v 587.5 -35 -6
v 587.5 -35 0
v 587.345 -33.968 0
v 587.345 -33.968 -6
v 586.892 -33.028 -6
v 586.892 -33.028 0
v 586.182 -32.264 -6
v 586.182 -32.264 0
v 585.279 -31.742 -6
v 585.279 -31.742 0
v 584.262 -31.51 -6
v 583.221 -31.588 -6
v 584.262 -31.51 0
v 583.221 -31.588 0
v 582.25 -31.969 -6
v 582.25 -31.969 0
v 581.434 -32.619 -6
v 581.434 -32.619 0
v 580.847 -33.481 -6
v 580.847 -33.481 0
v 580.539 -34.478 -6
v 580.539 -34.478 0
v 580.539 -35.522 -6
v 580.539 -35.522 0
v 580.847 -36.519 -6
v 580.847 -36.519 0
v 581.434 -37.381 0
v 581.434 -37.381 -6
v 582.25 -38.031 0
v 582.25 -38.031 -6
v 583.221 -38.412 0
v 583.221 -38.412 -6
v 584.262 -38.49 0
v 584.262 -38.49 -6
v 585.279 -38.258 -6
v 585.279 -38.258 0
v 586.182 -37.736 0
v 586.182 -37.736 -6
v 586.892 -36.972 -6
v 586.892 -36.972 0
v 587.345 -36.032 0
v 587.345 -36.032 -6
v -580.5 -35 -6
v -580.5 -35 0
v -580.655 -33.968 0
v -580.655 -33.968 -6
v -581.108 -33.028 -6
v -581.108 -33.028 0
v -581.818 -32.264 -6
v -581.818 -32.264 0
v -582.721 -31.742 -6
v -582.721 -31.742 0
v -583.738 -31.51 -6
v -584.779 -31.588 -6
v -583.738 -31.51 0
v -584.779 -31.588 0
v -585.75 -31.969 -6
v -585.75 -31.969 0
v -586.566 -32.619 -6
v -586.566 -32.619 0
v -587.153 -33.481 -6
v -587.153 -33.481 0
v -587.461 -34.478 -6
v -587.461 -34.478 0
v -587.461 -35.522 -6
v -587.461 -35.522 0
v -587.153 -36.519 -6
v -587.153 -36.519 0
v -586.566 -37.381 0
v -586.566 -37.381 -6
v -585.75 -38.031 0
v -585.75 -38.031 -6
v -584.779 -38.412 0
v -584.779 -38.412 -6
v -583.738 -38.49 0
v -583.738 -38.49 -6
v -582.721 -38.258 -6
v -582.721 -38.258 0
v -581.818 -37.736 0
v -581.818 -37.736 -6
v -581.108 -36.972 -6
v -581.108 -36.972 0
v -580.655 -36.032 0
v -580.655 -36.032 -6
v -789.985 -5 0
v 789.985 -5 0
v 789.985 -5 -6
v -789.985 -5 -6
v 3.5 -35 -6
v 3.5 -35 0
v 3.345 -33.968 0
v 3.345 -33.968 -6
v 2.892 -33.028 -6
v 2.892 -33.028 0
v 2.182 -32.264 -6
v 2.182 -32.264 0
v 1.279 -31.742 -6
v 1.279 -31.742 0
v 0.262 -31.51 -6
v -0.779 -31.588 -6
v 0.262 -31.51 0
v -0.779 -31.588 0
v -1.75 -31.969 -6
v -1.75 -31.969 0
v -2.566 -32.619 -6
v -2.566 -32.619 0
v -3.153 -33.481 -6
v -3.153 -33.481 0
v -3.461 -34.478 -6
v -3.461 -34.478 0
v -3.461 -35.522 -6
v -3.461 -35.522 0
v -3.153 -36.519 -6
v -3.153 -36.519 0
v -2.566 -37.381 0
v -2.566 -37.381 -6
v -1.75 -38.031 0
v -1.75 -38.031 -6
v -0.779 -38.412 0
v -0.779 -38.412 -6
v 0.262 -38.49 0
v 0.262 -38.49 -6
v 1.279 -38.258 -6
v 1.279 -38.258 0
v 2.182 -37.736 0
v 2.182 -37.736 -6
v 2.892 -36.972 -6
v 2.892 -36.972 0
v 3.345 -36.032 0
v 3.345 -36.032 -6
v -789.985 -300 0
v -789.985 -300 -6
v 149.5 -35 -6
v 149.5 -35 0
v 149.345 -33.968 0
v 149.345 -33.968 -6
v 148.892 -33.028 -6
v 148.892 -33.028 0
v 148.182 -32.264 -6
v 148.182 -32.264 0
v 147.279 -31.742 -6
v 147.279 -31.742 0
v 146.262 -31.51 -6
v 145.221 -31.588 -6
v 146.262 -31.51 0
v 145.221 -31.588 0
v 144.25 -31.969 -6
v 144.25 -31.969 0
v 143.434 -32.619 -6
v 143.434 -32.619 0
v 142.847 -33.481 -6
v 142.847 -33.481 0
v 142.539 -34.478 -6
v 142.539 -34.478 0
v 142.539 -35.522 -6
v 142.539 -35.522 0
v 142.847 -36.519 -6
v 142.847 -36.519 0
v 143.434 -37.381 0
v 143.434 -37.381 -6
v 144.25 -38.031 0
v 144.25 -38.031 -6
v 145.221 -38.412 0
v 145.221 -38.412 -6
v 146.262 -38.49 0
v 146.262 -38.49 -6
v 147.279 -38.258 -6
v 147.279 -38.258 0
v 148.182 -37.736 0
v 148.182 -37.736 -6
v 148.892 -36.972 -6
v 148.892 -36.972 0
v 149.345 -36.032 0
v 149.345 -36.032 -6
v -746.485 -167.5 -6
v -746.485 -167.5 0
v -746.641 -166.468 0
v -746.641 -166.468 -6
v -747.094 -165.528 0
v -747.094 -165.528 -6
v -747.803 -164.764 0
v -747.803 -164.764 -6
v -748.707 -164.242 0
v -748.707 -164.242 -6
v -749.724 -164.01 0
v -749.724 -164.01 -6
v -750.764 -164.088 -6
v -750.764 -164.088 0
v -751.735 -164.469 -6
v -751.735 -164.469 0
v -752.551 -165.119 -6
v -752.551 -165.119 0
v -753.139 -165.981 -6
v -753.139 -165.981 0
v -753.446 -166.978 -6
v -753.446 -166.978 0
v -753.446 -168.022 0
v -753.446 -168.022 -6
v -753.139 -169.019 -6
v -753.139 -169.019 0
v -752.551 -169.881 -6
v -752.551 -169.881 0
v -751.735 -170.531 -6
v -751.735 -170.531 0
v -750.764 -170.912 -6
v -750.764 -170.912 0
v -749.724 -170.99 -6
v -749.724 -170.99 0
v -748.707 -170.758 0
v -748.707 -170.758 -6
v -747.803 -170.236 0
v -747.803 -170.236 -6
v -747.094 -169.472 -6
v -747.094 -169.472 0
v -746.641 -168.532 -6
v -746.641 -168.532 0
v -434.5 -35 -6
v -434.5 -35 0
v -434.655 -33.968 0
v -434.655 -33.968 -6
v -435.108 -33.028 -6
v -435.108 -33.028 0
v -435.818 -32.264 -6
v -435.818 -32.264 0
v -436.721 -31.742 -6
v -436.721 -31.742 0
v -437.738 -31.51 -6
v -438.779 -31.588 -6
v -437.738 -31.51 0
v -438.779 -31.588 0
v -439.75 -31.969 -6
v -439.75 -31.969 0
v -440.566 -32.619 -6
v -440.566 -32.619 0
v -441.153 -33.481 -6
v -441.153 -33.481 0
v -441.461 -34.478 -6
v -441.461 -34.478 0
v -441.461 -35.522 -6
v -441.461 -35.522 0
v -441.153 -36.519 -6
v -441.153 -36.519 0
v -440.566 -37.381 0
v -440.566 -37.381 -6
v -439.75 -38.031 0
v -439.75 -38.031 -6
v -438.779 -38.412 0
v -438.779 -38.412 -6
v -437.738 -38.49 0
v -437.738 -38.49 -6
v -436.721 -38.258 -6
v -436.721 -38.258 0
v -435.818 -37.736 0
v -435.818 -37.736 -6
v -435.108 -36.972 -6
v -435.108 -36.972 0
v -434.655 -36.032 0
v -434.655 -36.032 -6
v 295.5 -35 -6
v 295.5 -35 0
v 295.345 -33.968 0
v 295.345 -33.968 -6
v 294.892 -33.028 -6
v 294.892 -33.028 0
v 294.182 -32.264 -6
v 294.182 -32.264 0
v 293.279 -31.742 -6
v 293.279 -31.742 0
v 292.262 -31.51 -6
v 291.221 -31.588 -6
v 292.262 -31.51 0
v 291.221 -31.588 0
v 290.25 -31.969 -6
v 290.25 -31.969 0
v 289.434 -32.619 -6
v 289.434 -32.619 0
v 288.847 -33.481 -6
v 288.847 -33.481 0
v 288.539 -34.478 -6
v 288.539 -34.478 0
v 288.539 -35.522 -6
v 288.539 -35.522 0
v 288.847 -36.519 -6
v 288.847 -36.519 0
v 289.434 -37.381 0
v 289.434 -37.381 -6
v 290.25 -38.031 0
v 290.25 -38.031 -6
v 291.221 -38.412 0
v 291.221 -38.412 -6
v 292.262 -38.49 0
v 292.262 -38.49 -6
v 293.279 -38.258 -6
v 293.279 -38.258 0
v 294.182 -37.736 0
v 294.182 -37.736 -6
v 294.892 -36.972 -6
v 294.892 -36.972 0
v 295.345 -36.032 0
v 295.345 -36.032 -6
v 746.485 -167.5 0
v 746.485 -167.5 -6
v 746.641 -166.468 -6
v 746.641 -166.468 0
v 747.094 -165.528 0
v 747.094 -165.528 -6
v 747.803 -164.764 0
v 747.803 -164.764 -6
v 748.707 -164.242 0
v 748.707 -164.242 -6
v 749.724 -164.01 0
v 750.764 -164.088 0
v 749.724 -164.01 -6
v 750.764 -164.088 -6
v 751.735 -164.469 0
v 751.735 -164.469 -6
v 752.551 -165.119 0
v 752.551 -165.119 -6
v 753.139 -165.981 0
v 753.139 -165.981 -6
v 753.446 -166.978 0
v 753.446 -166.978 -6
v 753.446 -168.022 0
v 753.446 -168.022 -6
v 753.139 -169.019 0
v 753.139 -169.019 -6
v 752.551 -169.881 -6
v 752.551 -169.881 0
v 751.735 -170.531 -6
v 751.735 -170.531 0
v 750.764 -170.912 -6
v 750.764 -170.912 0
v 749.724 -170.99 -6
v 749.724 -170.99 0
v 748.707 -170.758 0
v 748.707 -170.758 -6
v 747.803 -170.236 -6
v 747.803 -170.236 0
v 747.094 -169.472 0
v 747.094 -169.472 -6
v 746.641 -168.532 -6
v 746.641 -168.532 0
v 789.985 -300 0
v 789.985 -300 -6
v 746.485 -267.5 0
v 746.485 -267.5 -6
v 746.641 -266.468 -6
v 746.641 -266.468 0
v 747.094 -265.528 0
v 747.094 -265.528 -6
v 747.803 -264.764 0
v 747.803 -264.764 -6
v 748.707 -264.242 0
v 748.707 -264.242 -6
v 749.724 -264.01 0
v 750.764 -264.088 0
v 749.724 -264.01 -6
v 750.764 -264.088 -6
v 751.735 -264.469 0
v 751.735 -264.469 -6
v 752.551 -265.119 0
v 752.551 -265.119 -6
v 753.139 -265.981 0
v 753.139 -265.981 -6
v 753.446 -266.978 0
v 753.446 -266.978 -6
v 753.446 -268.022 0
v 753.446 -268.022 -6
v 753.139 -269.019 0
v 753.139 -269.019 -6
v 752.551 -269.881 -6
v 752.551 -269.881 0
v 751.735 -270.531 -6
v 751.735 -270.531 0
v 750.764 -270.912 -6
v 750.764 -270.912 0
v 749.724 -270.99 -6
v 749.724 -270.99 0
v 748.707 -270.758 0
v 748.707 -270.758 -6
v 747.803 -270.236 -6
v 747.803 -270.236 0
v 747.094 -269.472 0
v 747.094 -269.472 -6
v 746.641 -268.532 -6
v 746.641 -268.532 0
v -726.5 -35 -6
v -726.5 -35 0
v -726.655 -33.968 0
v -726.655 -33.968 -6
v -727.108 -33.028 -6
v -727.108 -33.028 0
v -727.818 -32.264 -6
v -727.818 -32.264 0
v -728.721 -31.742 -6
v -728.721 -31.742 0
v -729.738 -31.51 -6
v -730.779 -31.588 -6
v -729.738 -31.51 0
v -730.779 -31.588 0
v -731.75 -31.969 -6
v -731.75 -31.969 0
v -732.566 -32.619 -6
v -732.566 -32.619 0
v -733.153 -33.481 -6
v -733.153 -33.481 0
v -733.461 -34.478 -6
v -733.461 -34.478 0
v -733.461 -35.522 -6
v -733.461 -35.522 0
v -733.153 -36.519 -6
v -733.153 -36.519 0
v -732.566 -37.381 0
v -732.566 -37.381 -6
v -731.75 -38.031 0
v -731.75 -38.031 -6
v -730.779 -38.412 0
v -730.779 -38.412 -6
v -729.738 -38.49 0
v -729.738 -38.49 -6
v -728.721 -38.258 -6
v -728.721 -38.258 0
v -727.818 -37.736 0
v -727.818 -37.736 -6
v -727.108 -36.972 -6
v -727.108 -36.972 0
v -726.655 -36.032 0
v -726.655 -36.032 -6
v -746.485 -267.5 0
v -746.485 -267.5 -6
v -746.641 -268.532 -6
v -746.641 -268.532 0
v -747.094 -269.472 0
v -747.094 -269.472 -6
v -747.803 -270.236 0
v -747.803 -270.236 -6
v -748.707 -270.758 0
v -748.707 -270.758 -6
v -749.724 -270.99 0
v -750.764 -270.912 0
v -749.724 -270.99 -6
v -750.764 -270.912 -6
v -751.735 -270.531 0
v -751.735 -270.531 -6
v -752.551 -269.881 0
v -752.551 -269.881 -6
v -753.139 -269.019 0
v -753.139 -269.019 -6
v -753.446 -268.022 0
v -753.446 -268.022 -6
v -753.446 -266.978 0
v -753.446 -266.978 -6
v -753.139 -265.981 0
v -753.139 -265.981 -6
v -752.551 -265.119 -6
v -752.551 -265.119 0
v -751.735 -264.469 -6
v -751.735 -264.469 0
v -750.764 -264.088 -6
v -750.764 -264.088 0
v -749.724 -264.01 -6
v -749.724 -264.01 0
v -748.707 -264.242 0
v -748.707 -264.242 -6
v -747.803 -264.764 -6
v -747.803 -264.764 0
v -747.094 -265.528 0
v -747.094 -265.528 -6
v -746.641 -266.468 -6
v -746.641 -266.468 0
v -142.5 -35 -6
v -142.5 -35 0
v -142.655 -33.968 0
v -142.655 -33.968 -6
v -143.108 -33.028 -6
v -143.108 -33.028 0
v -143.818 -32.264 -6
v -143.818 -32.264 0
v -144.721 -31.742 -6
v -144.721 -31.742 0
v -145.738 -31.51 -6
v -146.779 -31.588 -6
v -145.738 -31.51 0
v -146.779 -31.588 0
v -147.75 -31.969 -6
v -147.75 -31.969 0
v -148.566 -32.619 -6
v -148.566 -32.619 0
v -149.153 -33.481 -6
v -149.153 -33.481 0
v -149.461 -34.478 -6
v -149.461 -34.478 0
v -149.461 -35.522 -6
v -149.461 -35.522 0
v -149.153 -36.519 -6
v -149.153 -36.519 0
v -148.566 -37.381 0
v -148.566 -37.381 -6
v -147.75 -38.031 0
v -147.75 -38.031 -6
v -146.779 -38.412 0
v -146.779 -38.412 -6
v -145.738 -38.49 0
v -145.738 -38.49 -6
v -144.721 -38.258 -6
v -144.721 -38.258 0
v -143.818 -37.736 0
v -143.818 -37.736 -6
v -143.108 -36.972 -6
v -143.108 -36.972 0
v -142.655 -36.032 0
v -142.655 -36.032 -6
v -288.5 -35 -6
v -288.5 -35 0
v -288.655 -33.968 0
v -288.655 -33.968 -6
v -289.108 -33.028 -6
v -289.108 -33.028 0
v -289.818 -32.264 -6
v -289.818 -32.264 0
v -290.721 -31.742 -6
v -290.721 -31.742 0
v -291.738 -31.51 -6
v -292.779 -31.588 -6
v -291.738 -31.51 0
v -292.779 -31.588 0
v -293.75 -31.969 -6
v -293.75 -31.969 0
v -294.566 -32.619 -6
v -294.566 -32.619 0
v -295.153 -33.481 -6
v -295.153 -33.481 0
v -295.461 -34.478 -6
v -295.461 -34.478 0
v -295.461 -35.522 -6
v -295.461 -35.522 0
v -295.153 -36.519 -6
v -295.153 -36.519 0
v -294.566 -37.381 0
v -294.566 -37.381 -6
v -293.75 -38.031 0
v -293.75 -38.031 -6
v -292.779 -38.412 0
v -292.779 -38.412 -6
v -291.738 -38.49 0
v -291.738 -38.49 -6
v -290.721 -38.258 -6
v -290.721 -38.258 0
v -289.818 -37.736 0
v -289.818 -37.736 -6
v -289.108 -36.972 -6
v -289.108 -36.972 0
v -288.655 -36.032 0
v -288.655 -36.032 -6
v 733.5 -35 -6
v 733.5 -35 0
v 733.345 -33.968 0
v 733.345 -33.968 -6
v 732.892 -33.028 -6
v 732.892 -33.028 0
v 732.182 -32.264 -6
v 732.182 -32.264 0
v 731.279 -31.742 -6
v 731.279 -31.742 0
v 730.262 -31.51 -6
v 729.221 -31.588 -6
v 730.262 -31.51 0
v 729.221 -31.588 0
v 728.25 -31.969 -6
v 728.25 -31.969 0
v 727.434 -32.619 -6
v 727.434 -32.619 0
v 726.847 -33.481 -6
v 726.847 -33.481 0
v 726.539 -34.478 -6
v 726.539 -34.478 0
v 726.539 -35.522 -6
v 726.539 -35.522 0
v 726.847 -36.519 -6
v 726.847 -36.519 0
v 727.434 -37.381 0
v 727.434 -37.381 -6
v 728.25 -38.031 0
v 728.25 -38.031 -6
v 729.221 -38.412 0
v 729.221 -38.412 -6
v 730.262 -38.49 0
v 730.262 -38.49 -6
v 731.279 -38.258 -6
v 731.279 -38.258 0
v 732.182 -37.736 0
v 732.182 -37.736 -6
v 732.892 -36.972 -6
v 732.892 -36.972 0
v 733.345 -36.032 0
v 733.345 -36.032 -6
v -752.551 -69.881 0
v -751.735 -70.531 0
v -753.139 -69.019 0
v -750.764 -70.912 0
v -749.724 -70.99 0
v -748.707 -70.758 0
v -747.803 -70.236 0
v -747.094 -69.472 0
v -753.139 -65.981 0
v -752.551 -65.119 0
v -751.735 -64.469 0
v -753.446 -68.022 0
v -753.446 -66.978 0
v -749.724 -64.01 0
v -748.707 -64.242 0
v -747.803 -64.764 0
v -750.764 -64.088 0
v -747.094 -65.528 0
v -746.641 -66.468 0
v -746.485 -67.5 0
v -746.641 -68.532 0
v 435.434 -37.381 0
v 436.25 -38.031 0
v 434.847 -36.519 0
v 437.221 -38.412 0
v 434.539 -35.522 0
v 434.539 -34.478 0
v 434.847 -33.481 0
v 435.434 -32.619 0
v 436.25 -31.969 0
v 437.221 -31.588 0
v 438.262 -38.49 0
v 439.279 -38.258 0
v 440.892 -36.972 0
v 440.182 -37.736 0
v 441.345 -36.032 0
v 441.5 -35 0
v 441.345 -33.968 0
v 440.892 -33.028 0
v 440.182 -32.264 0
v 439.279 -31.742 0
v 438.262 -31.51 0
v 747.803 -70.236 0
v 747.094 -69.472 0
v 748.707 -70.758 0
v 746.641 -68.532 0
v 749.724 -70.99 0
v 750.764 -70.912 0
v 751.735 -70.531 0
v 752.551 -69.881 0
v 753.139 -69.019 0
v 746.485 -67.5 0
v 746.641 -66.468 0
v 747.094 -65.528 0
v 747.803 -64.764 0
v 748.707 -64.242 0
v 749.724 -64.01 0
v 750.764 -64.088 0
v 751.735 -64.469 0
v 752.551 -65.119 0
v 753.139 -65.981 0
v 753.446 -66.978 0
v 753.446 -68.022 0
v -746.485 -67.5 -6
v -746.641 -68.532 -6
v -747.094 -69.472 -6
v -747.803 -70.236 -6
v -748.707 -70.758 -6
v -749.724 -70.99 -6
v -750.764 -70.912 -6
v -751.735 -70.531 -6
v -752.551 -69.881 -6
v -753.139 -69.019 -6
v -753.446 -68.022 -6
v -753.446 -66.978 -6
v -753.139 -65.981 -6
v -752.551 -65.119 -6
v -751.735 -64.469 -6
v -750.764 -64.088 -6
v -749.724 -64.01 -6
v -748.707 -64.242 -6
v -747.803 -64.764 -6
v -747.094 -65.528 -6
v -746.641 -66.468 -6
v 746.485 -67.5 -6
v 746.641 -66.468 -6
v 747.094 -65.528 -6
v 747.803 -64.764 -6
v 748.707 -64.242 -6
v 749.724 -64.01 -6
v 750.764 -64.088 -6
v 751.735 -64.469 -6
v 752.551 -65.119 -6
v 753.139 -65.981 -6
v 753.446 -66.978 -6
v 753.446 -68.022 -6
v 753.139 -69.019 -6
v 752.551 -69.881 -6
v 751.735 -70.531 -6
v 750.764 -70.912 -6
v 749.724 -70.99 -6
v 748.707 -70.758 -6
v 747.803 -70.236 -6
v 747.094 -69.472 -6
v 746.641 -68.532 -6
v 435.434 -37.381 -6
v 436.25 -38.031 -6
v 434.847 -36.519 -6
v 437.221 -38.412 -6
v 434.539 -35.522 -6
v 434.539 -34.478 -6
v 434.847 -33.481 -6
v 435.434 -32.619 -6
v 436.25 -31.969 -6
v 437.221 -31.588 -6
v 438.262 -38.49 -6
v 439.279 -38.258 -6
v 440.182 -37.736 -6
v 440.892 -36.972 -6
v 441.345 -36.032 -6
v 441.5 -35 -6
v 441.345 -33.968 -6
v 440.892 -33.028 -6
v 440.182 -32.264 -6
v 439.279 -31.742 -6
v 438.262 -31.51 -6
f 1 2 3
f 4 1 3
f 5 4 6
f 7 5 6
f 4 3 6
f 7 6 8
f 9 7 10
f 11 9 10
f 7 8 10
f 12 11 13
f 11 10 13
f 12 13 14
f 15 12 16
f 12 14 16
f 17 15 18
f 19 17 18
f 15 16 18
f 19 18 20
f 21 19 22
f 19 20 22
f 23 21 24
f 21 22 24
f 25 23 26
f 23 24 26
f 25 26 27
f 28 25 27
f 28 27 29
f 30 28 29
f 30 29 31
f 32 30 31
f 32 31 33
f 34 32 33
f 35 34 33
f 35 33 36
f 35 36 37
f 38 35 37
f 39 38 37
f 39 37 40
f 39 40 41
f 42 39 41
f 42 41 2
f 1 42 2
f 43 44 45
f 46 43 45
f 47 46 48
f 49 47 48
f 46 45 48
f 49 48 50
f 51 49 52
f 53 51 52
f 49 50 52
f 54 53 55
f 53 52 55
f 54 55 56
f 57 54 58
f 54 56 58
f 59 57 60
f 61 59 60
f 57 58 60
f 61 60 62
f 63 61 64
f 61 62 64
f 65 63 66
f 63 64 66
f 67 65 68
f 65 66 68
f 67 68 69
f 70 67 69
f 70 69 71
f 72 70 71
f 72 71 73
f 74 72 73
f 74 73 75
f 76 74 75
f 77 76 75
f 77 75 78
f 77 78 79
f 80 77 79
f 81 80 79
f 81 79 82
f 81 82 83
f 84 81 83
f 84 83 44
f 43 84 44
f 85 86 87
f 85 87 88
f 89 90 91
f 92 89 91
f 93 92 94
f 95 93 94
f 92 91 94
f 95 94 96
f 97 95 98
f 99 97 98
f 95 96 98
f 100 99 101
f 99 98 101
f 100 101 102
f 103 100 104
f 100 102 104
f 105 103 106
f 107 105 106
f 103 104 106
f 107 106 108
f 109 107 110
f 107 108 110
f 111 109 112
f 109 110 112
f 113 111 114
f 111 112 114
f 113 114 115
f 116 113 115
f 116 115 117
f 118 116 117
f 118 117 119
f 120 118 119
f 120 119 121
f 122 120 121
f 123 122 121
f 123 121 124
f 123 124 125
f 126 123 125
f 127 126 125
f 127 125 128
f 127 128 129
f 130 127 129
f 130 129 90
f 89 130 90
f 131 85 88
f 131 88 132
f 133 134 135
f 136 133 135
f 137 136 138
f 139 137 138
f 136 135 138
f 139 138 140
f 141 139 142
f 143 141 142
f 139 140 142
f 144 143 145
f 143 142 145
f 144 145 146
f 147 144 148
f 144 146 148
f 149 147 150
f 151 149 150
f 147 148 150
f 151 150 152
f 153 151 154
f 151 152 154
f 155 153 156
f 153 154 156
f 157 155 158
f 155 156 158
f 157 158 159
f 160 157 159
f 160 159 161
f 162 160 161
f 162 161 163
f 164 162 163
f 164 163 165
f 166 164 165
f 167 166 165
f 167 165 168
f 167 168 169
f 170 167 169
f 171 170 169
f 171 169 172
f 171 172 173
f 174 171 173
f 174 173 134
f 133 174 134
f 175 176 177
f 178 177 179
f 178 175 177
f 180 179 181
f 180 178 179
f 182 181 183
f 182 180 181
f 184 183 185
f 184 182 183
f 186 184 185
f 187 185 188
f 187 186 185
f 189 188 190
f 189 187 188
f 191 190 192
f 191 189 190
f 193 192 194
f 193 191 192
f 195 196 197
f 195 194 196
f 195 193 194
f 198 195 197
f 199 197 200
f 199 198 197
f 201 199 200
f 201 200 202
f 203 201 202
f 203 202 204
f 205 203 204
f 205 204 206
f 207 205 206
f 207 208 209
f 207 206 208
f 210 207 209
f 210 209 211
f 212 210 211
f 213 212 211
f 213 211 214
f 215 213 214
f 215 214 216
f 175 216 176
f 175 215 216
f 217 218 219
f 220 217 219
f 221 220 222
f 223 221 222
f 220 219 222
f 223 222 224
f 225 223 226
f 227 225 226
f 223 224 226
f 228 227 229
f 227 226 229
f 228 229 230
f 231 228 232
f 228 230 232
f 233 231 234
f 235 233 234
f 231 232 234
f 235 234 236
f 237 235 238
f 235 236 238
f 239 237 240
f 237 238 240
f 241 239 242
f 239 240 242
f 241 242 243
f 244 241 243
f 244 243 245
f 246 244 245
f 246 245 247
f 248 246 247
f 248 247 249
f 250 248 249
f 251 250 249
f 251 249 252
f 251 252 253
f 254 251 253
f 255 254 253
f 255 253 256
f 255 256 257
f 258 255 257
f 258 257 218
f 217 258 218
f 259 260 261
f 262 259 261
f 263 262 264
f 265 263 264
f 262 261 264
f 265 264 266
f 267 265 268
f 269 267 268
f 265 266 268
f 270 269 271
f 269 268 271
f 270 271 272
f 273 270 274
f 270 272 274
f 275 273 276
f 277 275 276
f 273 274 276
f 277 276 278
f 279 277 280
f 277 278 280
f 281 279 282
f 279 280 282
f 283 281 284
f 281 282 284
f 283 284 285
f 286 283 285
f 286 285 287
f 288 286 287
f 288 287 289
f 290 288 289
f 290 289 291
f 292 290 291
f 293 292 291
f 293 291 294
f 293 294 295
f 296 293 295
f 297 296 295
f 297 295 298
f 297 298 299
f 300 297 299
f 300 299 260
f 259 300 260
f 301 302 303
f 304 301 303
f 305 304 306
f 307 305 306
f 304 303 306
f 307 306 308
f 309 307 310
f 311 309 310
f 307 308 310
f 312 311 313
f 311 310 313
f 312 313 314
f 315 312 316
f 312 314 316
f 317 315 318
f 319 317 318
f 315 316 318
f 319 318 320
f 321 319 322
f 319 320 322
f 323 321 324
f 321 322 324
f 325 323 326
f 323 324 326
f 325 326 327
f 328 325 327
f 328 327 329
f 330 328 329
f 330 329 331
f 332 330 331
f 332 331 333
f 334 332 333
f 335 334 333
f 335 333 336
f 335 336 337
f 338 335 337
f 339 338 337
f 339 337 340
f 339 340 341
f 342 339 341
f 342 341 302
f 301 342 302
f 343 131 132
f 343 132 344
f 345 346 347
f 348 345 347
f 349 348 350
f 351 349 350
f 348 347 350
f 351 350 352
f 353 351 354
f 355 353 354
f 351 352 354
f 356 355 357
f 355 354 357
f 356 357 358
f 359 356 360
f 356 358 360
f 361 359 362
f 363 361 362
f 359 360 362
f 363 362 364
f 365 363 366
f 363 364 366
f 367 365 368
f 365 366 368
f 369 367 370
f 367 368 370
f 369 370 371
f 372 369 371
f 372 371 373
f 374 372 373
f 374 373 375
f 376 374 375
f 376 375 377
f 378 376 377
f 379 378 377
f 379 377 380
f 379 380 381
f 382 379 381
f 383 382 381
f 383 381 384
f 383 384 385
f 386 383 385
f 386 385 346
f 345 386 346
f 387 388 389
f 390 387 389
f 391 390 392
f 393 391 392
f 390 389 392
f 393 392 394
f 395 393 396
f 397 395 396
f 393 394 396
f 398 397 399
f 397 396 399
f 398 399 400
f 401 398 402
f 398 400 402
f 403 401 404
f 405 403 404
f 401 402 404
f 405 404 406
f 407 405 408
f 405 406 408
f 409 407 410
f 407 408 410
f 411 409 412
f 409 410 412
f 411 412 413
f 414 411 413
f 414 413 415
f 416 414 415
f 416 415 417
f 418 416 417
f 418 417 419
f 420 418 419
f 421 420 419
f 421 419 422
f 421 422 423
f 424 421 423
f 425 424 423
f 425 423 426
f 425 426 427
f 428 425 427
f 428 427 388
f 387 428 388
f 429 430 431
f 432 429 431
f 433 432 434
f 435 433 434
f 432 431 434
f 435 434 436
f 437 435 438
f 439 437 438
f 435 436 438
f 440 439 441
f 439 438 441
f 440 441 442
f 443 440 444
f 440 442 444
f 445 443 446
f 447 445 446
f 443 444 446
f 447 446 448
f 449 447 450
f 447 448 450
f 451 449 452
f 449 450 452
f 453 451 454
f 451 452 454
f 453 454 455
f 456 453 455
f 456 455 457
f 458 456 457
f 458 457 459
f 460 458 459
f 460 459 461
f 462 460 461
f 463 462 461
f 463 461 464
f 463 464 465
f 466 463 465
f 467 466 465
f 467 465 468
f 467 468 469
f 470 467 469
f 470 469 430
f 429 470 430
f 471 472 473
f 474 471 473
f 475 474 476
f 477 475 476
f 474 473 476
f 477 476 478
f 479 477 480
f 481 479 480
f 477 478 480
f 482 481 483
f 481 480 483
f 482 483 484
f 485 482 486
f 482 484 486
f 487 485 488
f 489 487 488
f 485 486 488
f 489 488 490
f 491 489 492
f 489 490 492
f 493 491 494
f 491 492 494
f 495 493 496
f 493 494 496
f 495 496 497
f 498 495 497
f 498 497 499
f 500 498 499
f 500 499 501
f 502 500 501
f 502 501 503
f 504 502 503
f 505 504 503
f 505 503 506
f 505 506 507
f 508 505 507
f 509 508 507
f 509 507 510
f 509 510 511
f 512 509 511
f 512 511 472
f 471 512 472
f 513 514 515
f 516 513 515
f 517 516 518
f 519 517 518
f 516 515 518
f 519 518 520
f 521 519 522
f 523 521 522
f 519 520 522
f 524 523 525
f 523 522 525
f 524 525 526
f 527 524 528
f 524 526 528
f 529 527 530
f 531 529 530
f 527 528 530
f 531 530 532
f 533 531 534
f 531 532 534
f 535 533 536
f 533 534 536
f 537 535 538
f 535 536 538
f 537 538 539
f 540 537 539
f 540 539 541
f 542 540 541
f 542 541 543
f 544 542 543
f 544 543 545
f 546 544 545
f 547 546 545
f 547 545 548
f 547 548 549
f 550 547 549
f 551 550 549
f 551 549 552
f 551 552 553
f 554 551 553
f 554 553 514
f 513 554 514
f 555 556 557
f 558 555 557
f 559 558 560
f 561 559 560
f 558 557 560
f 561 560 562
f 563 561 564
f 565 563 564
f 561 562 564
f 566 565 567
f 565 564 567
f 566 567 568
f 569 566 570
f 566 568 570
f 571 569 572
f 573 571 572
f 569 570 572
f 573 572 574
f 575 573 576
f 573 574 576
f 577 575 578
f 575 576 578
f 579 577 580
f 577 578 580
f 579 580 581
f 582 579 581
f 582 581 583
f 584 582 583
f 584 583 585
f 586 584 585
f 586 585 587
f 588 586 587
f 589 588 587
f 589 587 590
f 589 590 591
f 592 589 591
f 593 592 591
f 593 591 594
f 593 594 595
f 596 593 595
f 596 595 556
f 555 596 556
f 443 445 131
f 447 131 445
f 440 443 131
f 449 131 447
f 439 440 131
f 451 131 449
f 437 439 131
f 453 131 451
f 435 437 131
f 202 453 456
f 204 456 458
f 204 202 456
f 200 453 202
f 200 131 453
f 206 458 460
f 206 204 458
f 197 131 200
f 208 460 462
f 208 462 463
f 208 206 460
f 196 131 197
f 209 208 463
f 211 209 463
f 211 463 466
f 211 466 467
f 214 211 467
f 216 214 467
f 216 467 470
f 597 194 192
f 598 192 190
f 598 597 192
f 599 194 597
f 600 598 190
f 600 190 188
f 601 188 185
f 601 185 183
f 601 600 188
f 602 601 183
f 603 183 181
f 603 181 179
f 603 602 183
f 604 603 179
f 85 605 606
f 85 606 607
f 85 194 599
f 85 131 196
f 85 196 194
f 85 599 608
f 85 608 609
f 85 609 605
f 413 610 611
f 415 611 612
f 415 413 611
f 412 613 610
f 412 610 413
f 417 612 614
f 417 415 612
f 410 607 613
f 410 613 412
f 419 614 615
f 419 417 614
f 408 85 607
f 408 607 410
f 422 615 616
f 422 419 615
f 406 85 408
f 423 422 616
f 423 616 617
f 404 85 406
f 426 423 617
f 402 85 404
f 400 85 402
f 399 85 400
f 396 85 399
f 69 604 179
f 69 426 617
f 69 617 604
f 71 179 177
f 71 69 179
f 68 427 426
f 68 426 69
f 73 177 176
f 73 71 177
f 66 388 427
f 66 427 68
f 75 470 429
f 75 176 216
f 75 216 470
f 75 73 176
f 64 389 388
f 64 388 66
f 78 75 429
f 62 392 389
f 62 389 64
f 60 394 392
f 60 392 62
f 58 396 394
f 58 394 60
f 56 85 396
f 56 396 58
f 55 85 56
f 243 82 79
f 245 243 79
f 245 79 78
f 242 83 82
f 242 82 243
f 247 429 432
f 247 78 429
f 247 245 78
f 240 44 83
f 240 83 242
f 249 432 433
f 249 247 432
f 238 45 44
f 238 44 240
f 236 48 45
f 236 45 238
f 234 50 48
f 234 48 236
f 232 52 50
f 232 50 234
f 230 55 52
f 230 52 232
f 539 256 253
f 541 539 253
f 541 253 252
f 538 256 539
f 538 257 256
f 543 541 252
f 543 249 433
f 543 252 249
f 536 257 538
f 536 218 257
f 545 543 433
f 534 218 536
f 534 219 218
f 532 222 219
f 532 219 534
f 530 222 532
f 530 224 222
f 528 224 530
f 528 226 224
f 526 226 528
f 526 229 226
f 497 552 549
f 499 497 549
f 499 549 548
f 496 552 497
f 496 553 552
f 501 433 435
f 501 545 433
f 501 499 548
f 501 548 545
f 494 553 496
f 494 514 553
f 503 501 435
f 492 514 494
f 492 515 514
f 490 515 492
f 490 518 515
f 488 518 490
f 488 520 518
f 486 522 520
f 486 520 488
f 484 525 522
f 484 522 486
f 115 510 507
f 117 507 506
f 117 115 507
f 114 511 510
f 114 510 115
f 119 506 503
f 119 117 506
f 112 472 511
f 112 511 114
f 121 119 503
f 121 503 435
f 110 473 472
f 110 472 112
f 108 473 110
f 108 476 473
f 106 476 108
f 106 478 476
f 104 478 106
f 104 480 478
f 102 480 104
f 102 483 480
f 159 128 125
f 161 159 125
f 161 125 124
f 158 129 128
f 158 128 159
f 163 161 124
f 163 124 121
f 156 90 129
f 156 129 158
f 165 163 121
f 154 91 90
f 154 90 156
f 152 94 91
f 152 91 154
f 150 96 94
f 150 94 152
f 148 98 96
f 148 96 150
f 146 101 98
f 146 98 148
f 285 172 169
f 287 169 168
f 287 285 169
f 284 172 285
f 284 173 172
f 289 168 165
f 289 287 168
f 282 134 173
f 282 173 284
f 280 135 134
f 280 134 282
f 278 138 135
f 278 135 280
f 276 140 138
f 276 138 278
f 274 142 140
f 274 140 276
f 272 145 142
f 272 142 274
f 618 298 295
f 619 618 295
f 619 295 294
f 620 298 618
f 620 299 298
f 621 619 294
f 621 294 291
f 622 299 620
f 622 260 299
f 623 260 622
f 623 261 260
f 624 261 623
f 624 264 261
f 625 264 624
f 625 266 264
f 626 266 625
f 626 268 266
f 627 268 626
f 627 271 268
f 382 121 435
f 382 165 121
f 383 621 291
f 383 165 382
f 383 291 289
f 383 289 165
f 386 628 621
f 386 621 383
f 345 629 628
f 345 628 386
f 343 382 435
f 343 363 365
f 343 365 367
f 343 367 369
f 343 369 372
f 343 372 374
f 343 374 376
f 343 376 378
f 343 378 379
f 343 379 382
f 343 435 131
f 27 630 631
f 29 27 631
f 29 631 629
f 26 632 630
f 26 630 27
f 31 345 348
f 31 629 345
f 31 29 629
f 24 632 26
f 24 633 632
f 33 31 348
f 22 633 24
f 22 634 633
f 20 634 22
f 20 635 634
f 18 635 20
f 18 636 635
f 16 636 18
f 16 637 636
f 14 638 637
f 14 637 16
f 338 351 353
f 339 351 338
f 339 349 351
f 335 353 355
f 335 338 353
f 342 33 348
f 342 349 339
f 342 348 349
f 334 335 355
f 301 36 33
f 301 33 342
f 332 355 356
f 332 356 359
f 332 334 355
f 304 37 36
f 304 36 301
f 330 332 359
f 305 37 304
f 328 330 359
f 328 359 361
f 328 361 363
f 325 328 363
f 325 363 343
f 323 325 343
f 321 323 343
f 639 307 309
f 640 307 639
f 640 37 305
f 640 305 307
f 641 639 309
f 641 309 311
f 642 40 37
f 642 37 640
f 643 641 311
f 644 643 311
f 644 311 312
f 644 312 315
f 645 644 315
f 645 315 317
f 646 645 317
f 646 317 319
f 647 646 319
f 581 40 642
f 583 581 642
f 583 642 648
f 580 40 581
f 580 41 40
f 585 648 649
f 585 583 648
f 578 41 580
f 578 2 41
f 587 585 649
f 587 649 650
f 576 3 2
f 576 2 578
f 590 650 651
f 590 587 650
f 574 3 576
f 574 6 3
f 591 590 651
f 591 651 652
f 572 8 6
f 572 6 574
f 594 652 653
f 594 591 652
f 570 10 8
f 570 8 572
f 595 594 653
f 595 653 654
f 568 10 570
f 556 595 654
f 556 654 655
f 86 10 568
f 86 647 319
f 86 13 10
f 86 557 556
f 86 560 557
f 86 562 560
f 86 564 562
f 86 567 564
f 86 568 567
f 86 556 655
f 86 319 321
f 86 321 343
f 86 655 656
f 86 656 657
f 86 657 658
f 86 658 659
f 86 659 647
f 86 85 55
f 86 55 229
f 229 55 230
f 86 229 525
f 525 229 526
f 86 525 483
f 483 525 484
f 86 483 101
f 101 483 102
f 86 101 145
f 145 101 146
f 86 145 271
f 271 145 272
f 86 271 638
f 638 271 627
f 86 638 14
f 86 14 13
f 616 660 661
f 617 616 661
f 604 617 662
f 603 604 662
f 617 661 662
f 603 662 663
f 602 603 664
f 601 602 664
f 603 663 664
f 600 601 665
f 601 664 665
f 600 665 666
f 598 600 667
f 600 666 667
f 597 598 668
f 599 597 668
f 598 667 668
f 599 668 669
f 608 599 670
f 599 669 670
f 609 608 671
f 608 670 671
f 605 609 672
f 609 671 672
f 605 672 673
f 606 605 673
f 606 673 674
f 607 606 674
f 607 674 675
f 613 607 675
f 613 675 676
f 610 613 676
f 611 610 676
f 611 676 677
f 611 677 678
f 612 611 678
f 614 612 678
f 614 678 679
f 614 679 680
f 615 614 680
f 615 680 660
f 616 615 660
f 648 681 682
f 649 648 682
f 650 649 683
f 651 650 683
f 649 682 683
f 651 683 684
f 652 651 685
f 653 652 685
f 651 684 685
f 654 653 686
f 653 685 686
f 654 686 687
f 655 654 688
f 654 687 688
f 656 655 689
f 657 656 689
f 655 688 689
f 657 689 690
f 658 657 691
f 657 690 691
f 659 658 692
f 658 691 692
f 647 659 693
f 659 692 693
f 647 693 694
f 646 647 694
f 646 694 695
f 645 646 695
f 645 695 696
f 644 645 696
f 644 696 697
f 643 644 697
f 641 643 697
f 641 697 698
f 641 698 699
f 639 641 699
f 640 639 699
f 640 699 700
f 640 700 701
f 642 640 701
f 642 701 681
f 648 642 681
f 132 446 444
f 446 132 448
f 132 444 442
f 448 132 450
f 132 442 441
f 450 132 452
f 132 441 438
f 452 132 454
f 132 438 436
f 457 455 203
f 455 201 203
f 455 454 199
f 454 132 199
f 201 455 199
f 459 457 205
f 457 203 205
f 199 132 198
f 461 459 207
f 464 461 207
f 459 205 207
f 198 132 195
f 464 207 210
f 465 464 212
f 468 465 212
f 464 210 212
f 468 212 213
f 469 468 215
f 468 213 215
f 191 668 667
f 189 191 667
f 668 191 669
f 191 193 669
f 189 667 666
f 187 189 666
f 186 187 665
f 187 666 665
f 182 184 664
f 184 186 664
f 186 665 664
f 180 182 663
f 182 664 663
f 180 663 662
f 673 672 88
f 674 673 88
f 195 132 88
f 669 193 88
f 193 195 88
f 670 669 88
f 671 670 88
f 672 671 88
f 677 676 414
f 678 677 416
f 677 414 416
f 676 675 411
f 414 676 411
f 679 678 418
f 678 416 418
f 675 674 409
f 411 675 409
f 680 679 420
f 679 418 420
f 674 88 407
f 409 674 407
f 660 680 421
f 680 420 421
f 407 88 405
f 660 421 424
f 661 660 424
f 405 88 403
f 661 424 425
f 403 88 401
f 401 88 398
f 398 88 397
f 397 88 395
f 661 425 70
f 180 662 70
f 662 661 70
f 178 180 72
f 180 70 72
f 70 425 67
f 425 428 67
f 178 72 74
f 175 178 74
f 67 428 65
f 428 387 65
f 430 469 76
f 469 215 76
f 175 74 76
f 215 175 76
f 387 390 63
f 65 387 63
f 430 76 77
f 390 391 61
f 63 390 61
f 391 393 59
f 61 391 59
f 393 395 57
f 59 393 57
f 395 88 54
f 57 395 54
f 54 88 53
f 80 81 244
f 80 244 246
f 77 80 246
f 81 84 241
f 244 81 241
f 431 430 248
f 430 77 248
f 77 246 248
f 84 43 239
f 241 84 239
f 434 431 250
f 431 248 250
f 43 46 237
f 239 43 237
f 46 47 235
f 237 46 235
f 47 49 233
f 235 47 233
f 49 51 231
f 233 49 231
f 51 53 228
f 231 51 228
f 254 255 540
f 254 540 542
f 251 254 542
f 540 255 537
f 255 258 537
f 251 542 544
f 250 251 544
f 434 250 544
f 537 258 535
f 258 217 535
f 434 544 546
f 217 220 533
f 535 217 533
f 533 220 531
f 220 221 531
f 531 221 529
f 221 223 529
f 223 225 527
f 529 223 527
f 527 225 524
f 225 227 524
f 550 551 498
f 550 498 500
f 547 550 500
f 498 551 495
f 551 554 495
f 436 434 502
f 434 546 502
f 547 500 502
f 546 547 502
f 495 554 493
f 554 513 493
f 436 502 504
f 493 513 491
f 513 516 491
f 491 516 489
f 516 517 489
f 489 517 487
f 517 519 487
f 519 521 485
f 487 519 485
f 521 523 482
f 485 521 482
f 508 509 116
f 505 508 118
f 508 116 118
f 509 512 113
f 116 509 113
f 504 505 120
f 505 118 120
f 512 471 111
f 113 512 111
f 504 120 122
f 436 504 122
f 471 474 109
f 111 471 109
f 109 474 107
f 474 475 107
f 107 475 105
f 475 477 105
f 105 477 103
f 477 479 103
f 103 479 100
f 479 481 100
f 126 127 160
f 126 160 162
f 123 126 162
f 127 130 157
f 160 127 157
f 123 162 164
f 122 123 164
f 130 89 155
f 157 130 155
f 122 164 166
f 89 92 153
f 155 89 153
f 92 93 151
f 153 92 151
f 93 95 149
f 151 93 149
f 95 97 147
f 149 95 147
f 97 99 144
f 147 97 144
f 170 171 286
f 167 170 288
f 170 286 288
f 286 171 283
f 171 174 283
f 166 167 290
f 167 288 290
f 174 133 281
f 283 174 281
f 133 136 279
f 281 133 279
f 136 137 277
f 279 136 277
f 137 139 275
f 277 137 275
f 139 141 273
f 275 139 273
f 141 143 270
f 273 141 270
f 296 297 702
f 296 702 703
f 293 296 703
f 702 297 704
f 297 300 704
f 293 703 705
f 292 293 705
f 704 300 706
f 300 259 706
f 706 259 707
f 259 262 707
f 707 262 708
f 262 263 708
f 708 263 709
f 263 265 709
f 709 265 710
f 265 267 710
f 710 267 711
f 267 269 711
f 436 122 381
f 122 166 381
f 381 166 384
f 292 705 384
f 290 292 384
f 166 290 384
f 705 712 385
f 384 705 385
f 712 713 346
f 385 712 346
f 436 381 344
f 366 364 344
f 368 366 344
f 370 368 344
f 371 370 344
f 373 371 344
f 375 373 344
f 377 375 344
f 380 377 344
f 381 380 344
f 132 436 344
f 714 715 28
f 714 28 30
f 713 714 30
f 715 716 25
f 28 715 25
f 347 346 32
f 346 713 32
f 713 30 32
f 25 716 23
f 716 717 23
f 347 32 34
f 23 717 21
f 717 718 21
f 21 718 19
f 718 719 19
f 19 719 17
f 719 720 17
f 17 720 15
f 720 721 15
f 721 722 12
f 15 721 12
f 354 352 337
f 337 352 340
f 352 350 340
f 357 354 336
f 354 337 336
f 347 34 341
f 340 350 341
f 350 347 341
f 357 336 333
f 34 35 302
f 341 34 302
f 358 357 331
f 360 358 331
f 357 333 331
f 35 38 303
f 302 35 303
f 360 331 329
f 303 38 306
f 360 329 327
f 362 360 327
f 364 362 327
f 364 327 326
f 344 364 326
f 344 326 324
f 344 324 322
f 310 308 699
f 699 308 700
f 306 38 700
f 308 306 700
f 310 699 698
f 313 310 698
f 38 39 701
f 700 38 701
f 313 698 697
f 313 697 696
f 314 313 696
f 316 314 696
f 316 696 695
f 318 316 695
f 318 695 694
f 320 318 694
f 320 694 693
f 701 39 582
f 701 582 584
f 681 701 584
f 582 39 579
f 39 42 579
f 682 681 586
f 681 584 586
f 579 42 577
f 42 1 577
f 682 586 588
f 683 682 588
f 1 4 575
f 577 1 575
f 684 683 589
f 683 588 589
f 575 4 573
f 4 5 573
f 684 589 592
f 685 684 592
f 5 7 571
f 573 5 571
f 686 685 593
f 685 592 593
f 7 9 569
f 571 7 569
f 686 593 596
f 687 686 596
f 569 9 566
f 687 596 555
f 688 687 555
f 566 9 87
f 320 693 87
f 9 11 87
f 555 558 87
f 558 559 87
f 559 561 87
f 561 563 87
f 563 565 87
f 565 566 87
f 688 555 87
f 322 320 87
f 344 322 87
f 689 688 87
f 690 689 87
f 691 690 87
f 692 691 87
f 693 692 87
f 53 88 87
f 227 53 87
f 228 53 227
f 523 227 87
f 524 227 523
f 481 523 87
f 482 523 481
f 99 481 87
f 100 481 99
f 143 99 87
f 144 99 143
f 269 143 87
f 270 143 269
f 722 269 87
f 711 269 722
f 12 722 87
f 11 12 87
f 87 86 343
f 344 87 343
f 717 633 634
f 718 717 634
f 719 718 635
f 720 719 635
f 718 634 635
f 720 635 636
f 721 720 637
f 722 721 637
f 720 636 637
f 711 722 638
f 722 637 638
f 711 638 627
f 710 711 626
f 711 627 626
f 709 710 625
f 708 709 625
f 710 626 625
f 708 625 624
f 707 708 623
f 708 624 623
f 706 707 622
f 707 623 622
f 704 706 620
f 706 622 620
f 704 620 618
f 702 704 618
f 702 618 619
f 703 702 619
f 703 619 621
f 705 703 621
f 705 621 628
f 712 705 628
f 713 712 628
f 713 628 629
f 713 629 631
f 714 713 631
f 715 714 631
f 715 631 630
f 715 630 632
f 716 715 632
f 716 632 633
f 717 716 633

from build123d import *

# Parameters (mm, degrees)
BASE_FLANGE1_DEPTH      = 6
SKETCH6_W               = 1952.366883789
SKETCH6_H               = 635.232253026
CUT_EXTRUDE1_DEPTH      = 10
CUT_EXTRUDE2_DEPTH      = 10
SKETCH8_R               = 3.5
CUT_EXTRUDE3_DEPTH      = 10
LPATTERN1_COUNT         = 6
LPATTERN1_PITCH         = 146
LPATTERN1_COL_COUNT     = 6
LPATTERN1_COL_PITCH     = 146
SKETCH9_R               = 3.5
CUT_EXTRUDE4_DEPTH      = 10
LPATTERN2_COUNT         = 2
LPATTERN2_PITCH         = 100
LPATTERN2_COL_COUNT     = 2
LPATTERN2_COL_PITCH     = 100
MIRROR2_COPY_1_SKETCH_R = 3.5
MIRROR2_COPY_1_DEPTH    = 10
MIRROR2_COPY_2_SKETCH_R = 3.5
MIRROR2_COPY_2_DEPTH    = 10


# Sheet-metal steps are written as plain solids
with BuildPart() as part:
    # Sketch1 → Base-Flange1 (new body)
    with BuildSketch(Plane.XY):
        with BuildLine():
            Line((859.985464993, -5), (-859.985464993, -5))
            ThreePointArc((-859.985464993, -5), (0, -860), (859.985464993, -5))
        make_face()
    extrude(amount=-BASE_FLANGE1_DEPTH)

    # Sketch6 → Cut-Extrude1 (cut)
    with BuildSketch(Plane.XY):
        with Locations((-97.229426483, -617.616126513)):
            Rectangle(SKETCH6_W, SKETCH6_H)
    extrude(amount=-CUT_EXTRUDE1_DEPTH, mode=Mode.SUBTRACT)

    # Sketch7 → Cut-Extrude2 (cut)
    with BuildSketch(Plane.XY):
        with BuildLine():
            Line((-859.985464993, -5), (-789.985464993, -5))
            Line((-789.985464993, -5), (-789.985464993, -300))
            Line((-789.985464993, -300), (-805.977667184, -300))
            ThreePointArc((-805.977667184, -300), (-845.940033007, -154.872400886), (-859.985464993, -5))
        make_face()
    cut_extrude2 = extrude(amount=-CUT_EXTRUDE2_DEPTH, mode=Mode.SUBTRACT)

    # Mirror1: Cut-Extrude2 across plane
    add(cut_extrude2.mirror(Plane(origin=(0, 0, 0), x_dir=(0, 0, 1), z_dir=(1, 0, 0))), mode=Mode.SUBTRACT)

    # Sketch8 → Cut-Extrude3 (cut)
    with BuildSketch(Plane.XY):
        with Locations((0, -35)):
            Circle(SKETCH8_R)
    cut_extrude3 = extrude(amount=-CUT_EXTRUDE3_DEPTH, mode=Mode.SUBTRACT)

    # LPattern1: Cut-Extrude3 ×6
    with Locations(*[(-i * LPATTERN1_PITCH, 0, 0) for i in range(1, LPATTERN1_COUNT)]):
        add(cut_extrude3, mode=Mode.SUBTRACT)

    # LPattern1 col: Cut-Extrude3 ×6
    with Locations(*[(i * LPATTERN1_COL_PITCH, 0, 0) for i in range(1, LPATTERN1_COL_COUNT)]):
        add(cut_extrude3, mode=Mode.SUBTRACT)

    # Sketch9 → Cut-Extrude4 (cut)
    with BuildSketch(Plane(origin=(0, 0, -6), x_dir=(-1, 0, 0), z_dir=(0, 0, -1))):
        with Locations((-749.985464993, -167.5)):
            Circle(SKETCH9_R)
    cut_extrude4 = extrude(amount=-CUT_EXTRUDE4_DEPTH, mode=Mode.SUBTRACT)

    # LPattern2: Cut-Extrude4 ×2
    with Locations(*[(0, -i * LPATTERN2_PITCH, 0) for i in range(1, LPATTERN2_COUNT)]):
        add(cut_extrude4, mode=Mode.SUBTRACT)

    # LPattern2 col: Cut-Extrude4 ×2
    with Locations(*[(0, i * LPATTERN2_COL_PITCH, 0) for i in range(1, LPATTERN2_COL_COUNT)]):
        add(cut_extrude4, mode=Mode.SUBTRACT)

    # Mirror2: Cut-Extrude4 across plane
    add(cut_extrude4.mirror(Plane(origin=(0, 0, 0), x_dir=(0, 0, 1), z_dir=(1, 0, 0))), mode=Mode.SUBTRACT)

    # Mirror2 copy 1 sketch → Mirror2 copy 1 (cut)
    with BuildSketch(Plane(origin=(0, -100, -6), x_dir=(1, 0, 0), z_dir=(0, 0, -1))):
        with Locations((-749.985464993, 167.5)):
            Circle(MIRROR2_COPY_1_SKETCH_R)
    extrude(amount=-MIRROR2_COPY_1_DEPTH, mode=Mode.SUBTRACT)

    # Mirror2 copy 2 sketch → Mirror2 copy 2 (cut)
    with BuildSketch(Plane(origin=(0, 100, -6), x_dir=(1, 0, 0), z_dir=(0, 0, -1))):
        with Locations((-749.985464993, 167.5)):
            Circle(MIRROR2_COPY_2_SKETCH_R)
    extrude(amount=-MIRROR2_COPY_2_DEPTH, mode=Mode.SUBTRACT)


solid = part.part
